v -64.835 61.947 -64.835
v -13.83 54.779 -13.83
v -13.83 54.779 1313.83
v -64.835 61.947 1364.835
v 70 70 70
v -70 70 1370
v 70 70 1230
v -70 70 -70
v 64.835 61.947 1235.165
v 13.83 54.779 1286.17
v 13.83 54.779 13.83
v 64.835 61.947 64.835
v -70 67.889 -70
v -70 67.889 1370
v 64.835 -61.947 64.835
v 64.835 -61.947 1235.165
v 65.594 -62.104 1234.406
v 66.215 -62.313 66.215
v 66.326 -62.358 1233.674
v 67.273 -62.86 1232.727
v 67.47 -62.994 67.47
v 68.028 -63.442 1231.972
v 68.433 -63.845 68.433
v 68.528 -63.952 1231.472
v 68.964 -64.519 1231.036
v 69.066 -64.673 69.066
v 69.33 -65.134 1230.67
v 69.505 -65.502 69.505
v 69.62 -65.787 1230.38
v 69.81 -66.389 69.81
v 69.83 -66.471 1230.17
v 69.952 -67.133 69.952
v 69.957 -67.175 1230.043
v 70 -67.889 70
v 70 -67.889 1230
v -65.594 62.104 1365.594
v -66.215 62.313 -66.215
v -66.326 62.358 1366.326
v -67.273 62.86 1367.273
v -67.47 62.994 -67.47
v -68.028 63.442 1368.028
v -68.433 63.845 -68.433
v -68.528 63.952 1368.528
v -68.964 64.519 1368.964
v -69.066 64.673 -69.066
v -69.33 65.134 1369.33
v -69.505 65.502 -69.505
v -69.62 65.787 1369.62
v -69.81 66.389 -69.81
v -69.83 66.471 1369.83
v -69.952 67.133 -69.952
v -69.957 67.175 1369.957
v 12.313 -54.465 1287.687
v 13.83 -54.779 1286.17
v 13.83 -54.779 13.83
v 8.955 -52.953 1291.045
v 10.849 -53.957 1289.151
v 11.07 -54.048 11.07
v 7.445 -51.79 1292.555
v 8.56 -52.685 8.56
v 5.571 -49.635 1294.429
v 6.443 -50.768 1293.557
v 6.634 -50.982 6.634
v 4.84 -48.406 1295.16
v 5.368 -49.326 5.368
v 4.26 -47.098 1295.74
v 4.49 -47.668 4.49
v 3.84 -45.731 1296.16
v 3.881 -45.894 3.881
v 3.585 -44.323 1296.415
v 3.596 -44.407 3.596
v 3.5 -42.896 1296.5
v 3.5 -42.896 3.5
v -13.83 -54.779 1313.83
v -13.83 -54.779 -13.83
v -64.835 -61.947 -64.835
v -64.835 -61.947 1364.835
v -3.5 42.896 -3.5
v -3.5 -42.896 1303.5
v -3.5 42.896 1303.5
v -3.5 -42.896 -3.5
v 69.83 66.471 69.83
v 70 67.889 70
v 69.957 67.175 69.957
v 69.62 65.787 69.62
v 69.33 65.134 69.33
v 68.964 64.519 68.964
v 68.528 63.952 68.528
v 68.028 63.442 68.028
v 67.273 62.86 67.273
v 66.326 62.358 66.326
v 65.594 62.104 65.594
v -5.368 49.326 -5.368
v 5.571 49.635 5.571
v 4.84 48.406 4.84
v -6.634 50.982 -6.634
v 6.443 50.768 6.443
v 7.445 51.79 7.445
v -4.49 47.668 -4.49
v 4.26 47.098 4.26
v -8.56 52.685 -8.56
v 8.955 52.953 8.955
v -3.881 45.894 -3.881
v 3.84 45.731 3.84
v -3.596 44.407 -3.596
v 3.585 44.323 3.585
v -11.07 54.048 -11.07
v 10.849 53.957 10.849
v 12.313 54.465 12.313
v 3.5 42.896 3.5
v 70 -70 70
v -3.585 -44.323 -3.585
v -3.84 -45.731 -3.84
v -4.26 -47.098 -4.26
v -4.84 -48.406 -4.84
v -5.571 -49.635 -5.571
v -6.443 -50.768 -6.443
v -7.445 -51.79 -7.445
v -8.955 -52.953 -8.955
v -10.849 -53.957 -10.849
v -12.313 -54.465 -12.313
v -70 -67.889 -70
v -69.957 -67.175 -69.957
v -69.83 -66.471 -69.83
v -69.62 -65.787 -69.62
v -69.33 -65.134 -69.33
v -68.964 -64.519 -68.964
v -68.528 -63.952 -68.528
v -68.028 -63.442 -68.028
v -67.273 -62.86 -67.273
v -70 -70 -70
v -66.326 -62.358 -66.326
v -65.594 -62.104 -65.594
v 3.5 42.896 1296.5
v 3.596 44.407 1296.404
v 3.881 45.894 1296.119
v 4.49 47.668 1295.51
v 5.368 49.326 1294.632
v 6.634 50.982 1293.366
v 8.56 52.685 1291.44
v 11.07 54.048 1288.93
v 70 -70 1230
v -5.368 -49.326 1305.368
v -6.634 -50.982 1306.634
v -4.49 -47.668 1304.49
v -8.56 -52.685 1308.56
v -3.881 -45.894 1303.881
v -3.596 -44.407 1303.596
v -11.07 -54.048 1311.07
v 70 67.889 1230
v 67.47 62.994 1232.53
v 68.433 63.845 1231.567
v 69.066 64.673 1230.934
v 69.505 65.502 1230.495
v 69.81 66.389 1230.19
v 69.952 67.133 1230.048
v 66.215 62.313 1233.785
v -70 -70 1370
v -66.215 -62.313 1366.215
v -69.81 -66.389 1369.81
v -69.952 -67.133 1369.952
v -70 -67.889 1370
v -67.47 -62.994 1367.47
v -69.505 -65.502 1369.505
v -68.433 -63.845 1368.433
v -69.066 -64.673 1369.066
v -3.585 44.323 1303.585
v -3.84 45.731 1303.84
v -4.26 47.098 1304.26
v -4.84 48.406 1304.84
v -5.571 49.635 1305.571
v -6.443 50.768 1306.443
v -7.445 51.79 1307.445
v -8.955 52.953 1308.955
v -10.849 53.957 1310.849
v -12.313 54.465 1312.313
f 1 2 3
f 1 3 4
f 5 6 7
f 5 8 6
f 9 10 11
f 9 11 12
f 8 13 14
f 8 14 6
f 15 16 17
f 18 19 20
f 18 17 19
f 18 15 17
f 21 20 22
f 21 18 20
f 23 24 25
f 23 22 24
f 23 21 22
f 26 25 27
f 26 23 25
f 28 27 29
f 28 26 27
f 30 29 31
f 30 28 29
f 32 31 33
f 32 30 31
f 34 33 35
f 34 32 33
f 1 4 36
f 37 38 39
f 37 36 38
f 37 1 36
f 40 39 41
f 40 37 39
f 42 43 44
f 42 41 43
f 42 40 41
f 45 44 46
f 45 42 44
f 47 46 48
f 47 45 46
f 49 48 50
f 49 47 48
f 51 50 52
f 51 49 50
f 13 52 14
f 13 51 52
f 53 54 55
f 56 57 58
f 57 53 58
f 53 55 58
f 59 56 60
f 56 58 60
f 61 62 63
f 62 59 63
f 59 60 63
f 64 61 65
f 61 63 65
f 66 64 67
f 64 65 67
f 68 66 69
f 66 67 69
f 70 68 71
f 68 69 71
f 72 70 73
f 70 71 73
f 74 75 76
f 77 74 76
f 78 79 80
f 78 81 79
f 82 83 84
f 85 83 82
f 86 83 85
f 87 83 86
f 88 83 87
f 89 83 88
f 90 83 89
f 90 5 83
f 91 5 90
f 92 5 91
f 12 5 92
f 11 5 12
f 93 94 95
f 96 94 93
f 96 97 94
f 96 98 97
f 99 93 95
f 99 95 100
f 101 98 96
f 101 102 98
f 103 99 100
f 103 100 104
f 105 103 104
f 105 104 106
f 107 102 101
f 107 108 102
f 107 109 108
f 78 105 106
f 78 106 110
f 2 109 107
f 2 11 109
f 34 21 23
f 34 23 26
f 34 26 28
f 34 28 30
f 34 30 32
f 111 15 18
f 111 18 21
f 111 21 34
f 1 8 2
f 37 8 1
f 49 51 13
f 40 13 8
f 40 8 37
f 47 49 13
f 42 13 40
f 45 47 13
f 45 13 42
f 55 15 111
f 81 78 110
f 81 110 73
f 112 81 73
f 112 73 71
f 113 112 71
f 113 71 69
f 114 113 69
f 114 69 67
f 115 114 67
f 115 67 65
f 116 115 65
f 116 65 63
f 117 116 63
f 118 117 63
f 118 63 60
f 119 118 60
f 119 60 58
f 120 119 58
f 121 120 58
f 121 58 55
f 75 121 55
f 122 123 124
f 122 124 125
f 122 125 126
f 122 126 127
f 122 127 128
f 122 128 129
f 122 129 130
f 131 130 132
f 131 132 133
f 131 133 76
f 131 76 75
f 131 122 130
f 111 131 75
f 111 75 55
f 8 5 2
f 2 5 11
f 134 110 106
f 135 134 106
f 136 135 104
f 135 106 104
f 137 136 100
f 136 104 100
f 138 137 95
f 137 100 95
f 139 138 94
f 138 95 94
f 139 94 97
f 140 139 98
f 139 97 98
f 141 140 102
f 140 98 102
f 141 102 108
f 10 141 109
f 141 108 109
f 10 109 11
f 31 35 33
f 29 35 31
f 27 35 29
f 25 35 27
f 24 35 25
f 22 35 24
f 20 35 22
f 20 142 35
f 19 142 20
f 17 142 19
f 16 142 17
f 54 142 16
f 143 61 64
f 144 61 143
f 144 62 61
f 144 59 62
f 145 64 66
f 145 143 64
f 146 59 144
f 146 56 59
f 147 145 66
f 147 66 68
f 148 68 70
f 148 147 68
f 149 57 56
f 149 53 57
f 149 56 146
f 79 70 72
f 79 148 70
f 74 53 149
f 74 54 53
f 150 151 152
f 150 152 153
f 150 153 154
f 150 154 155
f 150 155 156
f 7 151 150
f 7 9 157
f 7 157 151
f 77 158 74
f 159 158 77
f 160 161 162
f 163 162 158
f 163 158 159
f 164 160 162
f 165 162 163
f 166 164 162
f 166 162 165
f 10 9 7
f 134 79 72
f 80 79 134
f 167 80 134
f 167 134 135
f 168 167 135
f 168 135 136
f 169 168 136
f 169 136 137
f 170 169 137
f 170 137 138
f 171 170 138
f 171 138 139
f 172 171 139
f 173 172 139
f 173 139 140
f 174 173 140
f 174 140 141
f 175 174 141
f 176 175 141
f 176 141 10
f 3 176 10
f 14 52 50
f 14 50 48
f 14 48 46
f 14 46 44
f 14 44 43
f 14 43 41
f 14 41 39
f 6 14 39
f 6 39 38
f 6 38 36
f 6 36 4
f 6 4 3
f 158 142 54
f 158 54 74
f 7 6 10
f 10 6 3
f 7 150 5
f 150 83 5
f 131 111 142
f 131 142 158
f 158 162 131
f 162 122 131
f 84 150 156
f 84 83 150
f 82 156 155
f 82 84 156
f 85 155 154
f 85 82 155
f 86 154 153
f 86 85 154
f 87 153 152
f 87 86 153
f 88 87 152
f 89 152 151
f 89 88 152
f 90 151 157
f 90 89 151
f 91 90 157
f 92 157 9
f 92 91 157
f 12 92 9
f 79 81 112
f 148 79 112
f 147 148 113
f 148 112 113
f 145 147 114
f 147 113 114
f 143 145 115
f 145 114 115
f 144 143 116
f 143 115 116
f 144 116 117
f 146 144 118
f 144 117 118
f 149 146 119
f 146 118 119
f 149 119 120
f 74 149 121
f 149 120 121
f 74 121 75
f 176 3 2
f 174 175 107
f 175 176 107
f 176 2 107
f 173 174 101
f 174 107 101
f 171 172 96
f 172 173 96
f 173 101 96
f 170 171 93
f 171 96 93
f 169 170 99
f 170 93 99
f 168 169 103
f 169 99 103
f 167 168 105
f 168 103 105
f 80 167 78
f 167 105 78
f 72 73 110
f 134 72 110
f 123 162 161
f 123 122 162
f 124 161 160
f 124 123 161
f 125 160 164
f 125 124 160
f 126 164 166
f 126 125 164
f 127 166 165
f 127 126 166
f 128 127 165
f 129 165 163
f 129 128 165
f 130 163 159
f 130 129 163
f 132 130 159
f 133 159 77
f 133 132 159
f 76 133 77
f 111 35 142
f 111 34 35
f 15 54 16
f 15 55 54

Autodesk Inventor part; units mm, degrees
ref_plane "Начальная плоскость" through (0, 0, -70) normal (0, 0, 1) x (1, 0, 0)
ref_plane "Конечная плоскость" through (0, 0, 1370) normal (0, 0, 1) x (1, 0, 0)
sketch "Эскиз" plane through (0, 0, 0) normal (0, 0, 1) x (1, 0, 0)
  line L0 (-3.5, 0) -> (-3.5, -42.8956)
  line L1 (-13.8299, -54.7788) -> (-64.835, -61.9471)
  line L2 (-70, -67.8887) -> (-70, -70)
  line L3 (-70, -70) -> (0, -70)
  line L4 (-36.75, -70) -> (-36.75, -58) construction
  line L5 (-61.3329, 0) -> (81.7772, 0) construction
  line L6 (0, 0) -> (0, -70) construction
  line L7 (0, -60) -> (0, 80) construction
  line L8 (3.5, 0) -> (3.5, -42.8956)
  line L9 (13.8299, -54.7788) -> (64.835, -61.9471)
  line L10 (70, -67.8887) -> (70, -70)
  line L11 (70, -70) -> (0, -70)
  line L12 (-3.5, 0) -> (0, 0) construction
  line L13 (-3.5, 0) -> (-3.5, 42.8956)
  line L14 (-13.8299, 54.7788) -> (-64.835, 61.9471)
  line L15 (-70, 67.8887) -> (-70, 70)
  line L16 (-70, 70) -> (0, 70)
  line L17 (3.5, 0) -> (3.5, 42.8956)
  line L18 (13.8299, 54.7788) -> (64.835, 61.9471)
  line L19 (70, 67.8887) -> (70, 70)
  line L20 (70, 70) -> (0, 70)
  arc A0 (-70, 67.8887) -> (-64.835, 61.9471) centre (-64, 67.8887) ccw
  arc A1 (64.835, 61.9471) -> (70, 67.8887) centre (64, 67.8887) ccw
  arc A2 (70, -67.8887) -> (64.835, -61.9471) centre (64, -67.8887) ccw
  arc A3 (-64.835, -61.9471) -> (-70, -67.8887) centre (-64, -67.8887) ccw
  arc A4 (-3.5, 42.8956) -> (-13.8299, 54.7788) centre (-15.5, 42.8956) ccw
  arc A5 (13.8299, 54.7788) -> (3.5, 42.8956) centre (15.5, 42.8956) ccw
  arc A6 (3.5, -42.8956) -> (13.8299, -54.7788) centre (15.5, -42.8956) ccw
  arc A7 (-13.8299, -54.7788) -> (-3.5, -42.8956) centre (-15.5, -42.8956) ccw
  line L21 (0, 110) -> (0, -100) construction
  line L22 (-101.6883, 0) -> (112.3548, 0) construction
  point P0 (-3.5, -53.327)
  point P1 (-70, -62.673)
  point P2 (3.5, -53.327)
  point P3 (70, -62.673)
  point P4 (36.75, -70)
  point P5 (36.75, -58)
  point P6 (-3.5, 53.327)
  point P7 (-70, 62.673)
  point P8 (-36.75, 70)
  point P9 (-36.75, 58)
  point P10 (3.5, 53.327)
  point P11 (70, 62.673)
  point P12 (36.75, 58)
  point P13 (36.75, 70)
  dimension "d1" = 12
  dimension "d2" = 33.25
  dimension "d3" = 3.5
  dimension "d4" = 70
  dimension "d9" = 70
  dimension "d14" = 98
  dimension "d15" = 6
  dimension "d16" = 12
extrude "Тело" add sketch "Эскиз" along normal up to surface (1440 mm away) from surface at -70
sketch "Sketch3" plane through (0, 0, 0) normal (0, 0, 1) x (1, 0, 0)
  line L0 (0, 0) -> (10, 0)
ref_plane "Work Plane3" through (0, 0, 0) normal (0, -1, 0) x (1, 0, 0)
sketch "Sketch4" plane through (0, 0, 0) normal (0, -1, 0) x (1, 0, 0)
  line L0 (-2, -70) -> (12, -70)
  line L1 (-2, 1370) -> (12, 1370)
  dimension "d20" = 1440
ref_plane "РабПлоскость4" through (-70, 0, 1370) normal (0.7071, 0, 0.7071) x (0.7071, 0, -0.7071)
split "Разделение1" plane through (-70, 0, 1370) removes the side toward (0.7071, 0, 0.7071)
ref_plane "РабПлоскость5" through (-70, 0, -70) normal (0.7071, 0, -0.7071) x (-0.7071, 0, -0.7071)
split "Разделение2" plane through (-70, 0, -70) removes the side toward (0.7071, 0, -0.7071)
equation "\"d1\" = G_T1"
equation "\"d2\" = -0.25 * G_T + 0.25 * G_W"
equation "\"d3\" = 0.5 * G_T"
equation "\"d4\" = 0.5 * G_W"
equation "\"d9\" = 0.5 * G_H"
equation "\"d14\" = G_NG"
equation "\"d15\" = G_ER"
equation "\"d16\" = G_IR"
equation "\"d5\" = G_L"
equation "\"G_T\" = 7"
equation "\"G_T1\" = 12"
equation "\"G_L\" = d20"
equation "\"G_ER\" = 6"
equation "\"G_IR\" = 12"
equation "\"G_NG\" = 98deg"
equation "\"G_W\" = 140"
equation "\"G_H\" = 140"
properties part number "ISO 657 16 - SC 140 - 1440" material "Сталь, мягкая"
